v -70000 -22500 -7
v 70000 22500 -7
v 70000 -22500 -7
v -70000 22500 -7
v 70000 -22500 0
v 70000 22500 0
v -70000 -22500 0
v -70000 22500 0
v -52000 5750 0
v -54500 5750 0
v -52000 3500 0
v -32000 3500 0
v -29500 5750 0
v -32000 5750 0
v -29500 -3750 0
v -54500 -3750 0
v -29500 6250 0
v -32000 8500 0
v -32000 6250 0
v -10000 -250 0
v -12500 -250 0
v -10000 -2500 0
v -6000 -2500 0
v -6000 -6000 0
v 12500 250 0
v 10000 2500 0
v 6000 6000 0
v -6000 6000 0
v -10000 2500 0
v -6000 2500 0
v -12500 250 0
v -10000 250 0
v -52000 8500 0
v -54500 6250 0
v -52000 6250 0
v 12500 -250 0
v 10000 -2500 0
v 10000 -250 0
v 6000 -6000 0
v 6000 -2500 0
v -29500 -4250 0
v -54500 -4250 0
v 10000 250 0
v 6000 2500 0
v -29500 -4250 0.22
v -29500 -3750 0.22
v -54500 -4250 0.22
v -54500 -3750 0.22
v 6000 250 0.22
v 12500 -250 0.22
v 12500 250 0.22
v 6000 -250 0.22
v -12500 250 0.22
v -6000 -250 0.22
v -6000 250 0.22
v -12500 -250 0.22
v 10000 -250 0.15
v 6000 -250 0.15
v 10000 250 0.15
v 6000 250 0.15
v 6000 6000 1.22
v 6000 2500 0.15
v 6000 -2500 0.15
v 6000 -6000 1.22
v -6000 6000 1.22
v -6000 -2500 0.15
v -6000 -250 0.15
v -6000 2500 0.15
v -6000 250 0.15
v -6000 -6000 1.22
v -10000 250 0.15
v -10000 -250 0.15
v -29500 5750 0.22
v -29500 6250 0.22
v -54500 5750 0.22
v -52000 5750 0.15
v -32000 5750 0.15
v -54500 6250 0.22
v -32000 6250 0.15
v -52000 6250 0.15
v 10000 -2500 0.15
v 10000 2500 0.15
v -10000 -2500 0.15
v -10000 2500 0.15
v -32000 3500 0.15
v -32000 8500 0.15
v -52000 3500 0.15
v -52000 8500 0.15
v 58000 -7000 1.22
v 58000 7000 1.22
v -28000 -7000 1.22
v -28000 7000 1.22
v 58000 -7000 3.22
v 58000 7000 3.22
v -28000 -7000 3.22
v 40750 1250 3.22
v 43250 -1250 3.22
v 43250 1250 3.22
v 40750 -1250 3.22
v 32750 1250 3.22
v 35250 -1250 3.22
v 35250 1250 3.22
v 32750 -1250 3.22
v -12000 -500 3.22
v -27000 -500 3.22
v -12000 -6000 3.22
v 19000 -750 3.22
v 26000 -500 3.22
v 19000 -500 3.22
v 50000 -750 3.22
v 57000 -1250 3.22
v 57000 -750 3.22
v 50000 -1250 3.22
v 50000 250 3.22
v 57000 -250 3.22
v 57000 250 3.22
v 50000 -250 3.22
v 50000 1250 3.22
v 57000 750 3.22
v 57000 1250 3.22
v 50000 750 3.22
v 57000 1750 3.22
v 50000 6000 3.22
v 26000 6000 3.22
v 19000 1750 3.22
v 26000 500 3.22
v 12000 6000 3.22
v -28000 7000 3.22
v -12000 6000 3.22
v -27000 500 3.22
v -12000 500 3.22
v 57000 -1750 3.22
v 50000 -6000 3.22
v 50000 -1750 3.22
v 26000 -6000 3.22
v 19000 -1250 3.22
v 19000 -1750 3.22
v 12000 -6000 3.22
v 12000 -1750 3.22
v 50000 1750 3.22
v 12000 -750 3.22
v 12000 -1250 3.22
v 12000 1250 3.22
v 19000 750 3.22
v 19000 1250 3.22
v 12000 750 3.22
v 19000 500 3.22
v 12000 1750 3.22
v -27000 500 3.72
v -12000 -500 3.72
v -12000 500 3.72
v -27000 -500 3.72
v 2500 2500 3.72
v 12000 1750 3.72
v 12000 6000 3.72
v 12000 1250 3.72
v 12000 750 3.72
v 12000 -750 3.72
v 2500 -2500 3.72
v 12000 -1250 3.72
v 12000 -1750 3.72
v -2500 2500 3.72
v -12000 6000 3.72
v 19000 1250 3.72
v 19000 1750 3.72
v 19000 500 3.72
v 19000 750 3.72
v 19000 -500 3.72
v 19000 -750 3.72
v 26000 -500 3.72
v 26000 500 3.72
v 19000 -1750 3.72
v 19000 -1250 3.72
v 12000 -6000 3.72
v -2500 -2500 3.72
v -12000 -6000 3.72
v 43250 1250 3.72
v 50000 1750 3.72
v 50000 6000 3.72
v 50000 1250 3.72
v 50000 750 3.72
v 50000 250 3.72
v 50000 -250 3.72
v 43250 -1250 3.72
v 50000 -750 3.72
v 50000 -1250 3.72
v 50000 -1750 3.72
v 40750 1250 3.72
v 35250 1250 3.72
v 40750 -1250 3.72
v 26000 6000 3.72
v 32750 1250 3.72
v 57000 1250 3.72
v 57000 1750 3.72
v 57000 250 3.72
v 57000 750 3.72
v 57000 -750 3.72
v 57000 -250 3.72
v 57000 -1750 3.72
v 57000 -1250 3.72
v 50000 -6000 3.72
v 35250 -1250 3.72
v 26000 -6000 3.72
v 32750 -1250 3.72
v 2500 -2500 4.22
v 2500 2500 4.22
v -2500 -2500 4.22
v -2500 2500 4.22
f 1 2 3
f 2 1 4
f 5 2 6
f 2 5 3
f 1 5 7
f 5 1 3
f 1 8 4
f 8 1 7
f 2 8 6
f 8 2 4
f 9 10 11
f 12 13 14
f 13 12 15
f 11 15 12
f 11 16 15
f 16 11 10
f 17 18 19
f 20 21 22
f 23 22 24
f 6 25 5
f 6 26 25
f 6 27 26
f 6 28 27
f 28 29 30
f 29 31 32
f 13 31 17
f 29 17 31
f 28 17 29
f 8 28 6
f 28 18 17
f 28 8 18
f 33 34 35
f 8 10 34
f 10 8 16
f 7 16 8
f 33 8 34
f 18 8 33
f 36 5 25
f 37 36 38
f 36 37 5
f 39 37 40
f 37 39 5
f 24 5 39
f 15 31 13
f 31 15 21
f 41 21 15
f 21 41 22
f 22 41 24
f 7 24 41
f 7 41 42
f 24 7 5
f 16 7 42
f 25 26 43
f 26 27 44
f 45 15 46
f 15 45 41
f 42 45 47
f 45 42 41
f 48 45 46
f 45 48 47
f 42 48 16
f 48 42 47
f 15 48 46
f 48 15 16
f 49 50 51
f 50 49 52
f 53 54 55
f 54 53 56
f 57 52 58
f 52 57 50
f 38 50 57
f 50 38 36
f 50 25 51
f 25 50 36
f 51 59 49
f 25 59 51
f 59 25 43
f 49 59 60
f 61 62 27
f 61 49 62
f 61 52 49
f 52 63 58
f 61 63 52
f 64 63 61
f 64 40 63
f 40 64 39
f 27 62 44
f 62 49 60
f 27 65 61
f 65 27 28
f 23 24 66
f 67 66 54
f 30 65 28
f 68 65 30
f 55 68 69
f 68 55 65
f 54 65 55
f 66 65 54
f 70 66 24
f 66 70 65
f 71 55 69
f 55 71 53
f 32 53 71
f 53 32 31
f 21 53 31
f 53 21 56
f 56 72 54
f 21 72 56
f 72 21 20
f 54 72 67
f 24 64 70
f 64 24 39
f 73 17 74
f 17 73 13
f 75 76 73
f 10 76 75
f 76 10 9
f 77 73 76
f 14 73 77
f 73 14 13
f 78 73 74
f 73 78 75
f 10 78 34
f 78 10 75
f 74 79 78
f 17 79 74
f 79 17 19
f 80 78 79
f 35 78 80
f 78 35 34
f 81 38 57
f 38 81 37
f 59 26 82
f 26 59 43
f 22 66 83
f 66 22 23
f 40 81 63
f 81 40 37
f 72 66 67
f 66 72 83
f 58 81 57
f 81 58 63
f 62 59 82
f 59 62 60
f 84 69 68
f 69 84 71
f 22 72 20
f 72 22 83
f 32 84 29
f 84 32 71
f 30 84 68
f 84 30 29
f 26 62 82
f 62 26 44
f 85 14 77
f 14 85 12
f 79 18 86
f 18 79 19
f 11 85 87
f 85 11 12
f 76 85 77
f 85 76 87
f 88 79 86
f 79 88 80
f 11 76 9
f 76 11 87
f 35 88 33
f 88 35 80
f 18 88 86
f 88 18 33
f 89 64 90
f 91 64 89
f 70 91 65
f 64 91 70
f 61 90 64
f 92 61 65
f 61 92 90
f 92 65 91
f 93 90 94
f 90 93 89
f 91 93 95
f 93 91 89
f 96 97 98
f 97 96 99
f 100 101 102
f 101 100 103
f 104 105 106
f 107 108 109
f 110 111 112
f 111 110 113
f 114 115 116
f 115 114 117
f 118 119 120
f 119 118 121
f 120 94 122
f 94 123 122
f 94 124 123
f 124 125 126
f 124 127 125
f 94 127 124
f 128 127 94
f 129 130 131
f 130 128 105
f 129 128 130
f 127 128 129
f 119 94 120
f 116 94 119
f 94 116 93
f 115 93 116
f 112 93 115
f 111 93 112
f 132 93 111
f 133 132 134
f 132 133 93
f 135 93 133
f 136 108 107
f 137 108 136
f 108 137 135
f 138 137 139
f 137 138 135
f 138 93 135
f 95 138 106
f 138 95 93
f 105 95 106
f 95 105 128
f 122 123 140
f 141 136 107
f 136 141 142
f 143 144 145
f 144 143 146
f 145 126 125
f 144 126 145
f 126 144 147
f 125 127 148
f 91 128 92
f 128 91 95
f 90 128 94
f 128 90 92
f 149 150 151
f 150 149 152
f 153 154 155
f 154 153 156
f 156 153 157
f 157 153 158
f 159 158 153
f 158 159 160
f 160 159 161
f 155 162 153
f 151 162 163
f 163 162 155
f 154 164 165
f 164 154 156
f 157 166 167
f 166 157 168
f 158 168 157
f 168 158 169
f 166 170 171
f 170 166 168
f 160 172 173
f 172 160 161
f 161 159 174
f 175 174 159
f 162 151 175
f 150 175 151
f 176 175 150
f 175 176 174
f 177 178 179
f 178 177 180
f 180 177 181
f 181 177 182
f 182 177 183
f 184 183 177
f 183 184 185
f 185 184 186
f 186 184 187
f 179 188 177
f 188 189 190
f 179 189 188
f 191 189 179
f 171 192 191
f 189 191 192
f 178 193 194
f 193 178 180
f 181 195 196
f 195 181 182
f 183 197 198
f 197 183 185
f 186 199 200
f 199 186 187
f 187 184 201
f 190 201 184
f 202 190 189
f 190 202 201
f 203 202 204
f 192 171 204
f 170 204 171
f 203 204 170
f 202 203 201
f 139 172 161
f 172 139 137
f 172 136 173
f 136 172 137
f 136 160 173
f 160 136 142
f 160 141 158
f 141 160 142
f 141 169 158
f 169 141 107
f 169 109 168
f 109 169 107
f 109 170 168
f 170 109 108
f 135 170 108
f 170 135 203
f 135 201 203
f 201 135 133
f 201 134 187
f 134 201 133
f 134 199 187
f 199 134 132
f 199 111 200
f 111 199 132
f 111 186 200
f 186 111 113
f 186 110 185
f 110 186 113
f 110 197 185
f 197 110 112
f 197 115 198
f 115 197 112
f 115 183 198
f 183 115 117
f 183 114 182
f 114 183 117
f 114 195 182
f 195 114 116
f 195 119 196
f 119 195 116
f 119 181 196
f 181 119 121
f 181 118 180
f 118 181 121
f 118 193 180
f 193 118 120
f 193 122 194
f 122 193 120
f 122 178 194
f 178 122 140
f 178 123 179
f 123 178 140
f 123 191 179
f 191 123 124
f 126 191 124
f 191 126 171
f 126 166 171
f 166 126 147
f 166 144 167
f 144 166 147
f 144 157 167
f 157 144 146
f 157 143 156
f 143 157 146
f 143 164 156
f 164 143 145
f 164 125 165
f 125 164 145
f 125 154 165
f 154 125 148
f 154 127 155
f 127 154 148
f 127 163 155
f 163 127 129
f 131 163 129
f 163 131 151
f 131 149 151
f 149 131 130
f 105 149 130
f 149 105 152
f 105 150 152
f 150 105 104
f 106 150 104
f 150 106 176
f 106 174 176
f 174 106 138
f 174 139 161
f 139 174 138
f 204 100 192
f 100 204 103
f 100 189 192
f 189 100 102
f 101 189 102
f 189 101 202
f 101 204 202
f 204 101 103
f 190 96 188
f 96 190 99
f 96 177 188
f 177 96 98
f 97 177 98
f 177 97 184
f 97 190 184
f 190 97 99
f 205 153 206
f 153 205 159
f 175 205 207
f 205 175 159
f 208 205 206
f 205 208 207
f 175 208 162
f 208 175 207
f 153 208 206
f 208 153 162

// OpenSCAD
// Generated by SolidPython 1.1.3 on 2026-02-12 11:32:57


scale(v = 1) {
	translate(v = [0, 0, 0]) {
		union() {
			color(alpha = 1.0000000000, c = [0.5500000000, 0.5500000000, 0.7000000000]) {
				translate(v = [0, 0, -7.0000000000]) {
					linear_extrude(height = 5.0000000000) {
						polygon(points = [[-70000, -22500], [-70000, 22500], [70000, 22500], [70000, -22500]]);
					}
				}
			}
			color(alpha = 1.0000000000, c = [0.8500000000, 0.8500000000, 0.6000000000]) {
				translate(v = [0, 0, -2.0000000000]) {
					linear_extrude(height = 2.0000000000) {
						polygon(points = [[-70000, -22500], [-70000, 22500], [70000, 22500], [70000, -22500]]);
					}
				}
			}
			color(alpha = 1.0000000000, c = [0.5500000000, 0.5500000000, 0.7000000000]) {
				translate(v = [0, 0, 0.0000000000]) {
					linear_extrude(height = 0.2200000000) {
						polygon(points = [[-54500, -4250], [-54500, -3750], [-29500, -3750], [-29500, -4250]]);
					}
				}
			}
			color(alpha = 1.0000000000, c = [0.5500000000, 0.5500000000, 0.7000000000]) {
				translate(v = [0, 0, 0.0000000000]) {
					linear_extrude(height = 0.2200000000) {
						polygon(points = [[-6000, -6000], [-6000, -250], [-12500, -250], [-12500, 250], [-6000, 250], [-6000, 6000], [6000, 6000], [6000, 250], [12500, 250], [12500, -250], [6000, -250], [6000, -6000]]);
					}
				}
			}
			color(alpha = 1.0000000000, c = [0.5500000000, 0.5500000000, 0.7000000000]) {
				translate(v = [0, 0, 0.0000000000]) {
					linear_extrude(height = 0.2200000000) {
						polygon(points = [[-54500, 5750], [-54500, 6250], [-29500, 6250], [-29500, 5750]]);
					}
				}
			}
			color(alpha = 1.0000000000, c = [0.5500000000, 0.5500000000, 0.7000000000]) {
				translate(v = [0, 0, 0.0000000000]) {
					linear_extrude(height = 0.1500000000) {
						polygon(points = [[-10000, -2500], [-10000, 2500], [10000, 2500], [10000, -2500]]);
					}
				}
			}
			color(alpha = 1.0000000000, c = [0.5500000000, 0.5500000000, 0.7000000000]) {
				translate(v = [0, 0, 0.0000000000]) {
					linear_extrude(height = 0.1500000000) {
						polygon(points = [[-52000, 3500], [-52000, 8500], [-32000, 8500], [-32000, 3500]]);
					}
				}
			}
			color(alpha = 1.0000000000, c = [0.8500000000, 0.8500000000, 0.6000000000]) {
				translate(v = [0, 0, 0.2200000000]) {
					linear_extrude(height = 1.0000000000) {
						polygon(points = [[-6000, -6000], [-6000, 6000], [6000, 6000], [6000, -6000]]);
					}
				}
			}
			color(alpha = 1.0000000000, c = [0.8500000000, 0.8500000000, 0.6000000000]) {
				translate(v = [0, 0, 1.2200000000]) {
					linear_extrude(height = 2.0000000000) {
						polygon(points = [[-28000, -7000], [-28000, 7000], [58000, 7000], [58000, -7000]]);
					}
				}
			}
			color(alpha = 1.0000000000, c = [0.9000000000, 0.7000000000, 0.7000000000]) {
				translate(v = [0, 0, 0.2200000000]) {
					linear_extrude(height = 0.2000000000) {
						polygon(points = [[-5000, -5000], [-5000, 5000], [5000, 5000], [5000, -5000]]);
					}
				}
			}
			color(alpha = 1.0000000000, c = [0.9000000000, 0.7000000000, 0.7000000000]) {
				translate(v = [0, 0, 3.2200000000]) {
					linear_extrude(height = 0.5000000000) {
						difference() {
							polygon(points = [[-12000, -6000], [-12000, -500], [-27000, -500], [-27000, 500], [-12000, 500], [-12000, 6000], [12000, 6000], [12000, 1750], [19000, 1750], [19000, 1250], [12000, 1250], [12000, 750], [19000, 750], [19000, 500], [26000, 500], [26000, 6000], [50000, 6000], [50000, 1750], [57000, 1750], [57000, 1250], [50000, 1250], [50000, 750], [57000, 750], [57000, 250], [50000, 250], [50000, -250], [57000, -250], [57000, -750], [50000, -750], [50000, -1250], [57000, -1250], [57000, -1750], [50000, -1750], [50000, -6000], [26000, -6000], [26000, -500], [19000, -500], [19000, -750], [12000, -750], [12000, -1250], [19000, -1250], [19000, -1750], [12000, -1750], [12000, -6000]]);
							polygon(points = [[-5250, -1250], [-2750, -1250], [-2750, 1250], [-5250, 1250]]);
							polygon(points = [[2750, -1250], [5250, -1250], [5250, 1250], [2750, 1250]]);
							polygon(points = [[32750, -1250], [35250, -1250], [35250, 1250], [32750, 1250]]);
							polygon(points = [[40750, -1250], [43250, -1250], [43250, 1250], [40750, 1250]]);
						}
					}
				}
			}
			color(alpha = 1.0000000000, c = [0.9000000000, 0.7000000000, 0.7000000000]) {
				translate(v = [0, 0, 3.2200000000]) {
					linear_extrude(height = 0.5000000000) {
						polygon(points = [[-5500, -5500], [-5500, 5500], [5500, 5500], [5500, -5500]]);
					}
				}
			}
			color(alpha = 1.0000000000, c = [0.7500000000, 0.7500000000, 0.7800000000]) {
				translate(v = [0, 0, 3.7200000000]) {
					linear_extrude(height = 0.5000000000) {
						polygon(points = [[-2500, -2500], [-2500, 2500], [2500, 2500], [2500, -2500]]);
					}
				}
			}
		}
	}
}
/***********************************************
*********      SolidPython code:      **********
************************************************
 
##
## Copyright (c) 2018-2019 Thomas Kramer.
## 
## This file is part of gds3xtrude 
## (see https://codeberg.org/tok/gds3xtrude).
## 
## This program is free software: you can redistribute it and/or modify
## it under the terms of the GNU Affero General Public License as
## published by the Free Software Foundation, either version 3 of the
## License, or (at your option) any later version.
## 
## This program is distributed in the hope that it will be useful,
## but WITHOUT ANY WARRANTY; without even the implied warranty of
## MERCHANTABILITY or FITNESS FOR A PARTICULAR PURPOSE.  See the
## GNU Affero General Public License for more details.
## 
## You should have received a copy of the GNU Affero General Public License
## along with this program. If not, see <http://www.gnu.org/licenses/>.
##

from .gds3xtrude import LayerStackBuilder, build_layerstack, DEFAULT_COLOR, DEFAULT_MATERIAL
from typing import Iterable, Tuple, Dict, Optional
from .types import Material
from solid import *
from solid import utils

# klayout.db should not be imported if script is run from KLayout GUI.
try:
    # Try to import pya if run inside KLayout GUI
    import pya
except:
    import klayout.db as pya

import logging

logger = logging.getLogger(__name__)


class OpenSCADLayerStackBuilder(LayerStackBuilder):

    def __init__(self):
        self.volumes = []
        self.scale_factor = 1
        self.translation = (0, 0, 0)

    def add_polygon(self,
                    hull: Iterable[Tuple[int, int]],
                    holes: Iterable[Iterable[Tuple[int, int]]],
                    z_offset: float,
                    thickness: float,
                    material: Material = DEFAULT_MATERIAL):
        solid_hull = polygon(hull)
        solid_holes = [polygon(h) for h in holes]

        if len(holes) > 0:
            solid_poly = difference()(solid_hull, *solid_holes)
        else:
            solid_poly = solid_hull

        volume = linear_extrude(thickness)(solid_poly)
        volume = utils.up(z_offset)(volume)
        volume = color(material.getattr('color', DEFAULT_COLOR))(volume)

        self.volumes.append(volume)

    def scale(self, f: float):
        self.scale_factor = f

    def translate(self, t: Tuple[float, float, float]):
        self.translation = t

    def build_volume(self):
        volume = scale(self.scale_factor)(
            translate(self.translation)(
                union()(*self.volumes)
            )
        )
        return volume


def render_scad_to_file(layout: pya.Layout,
                        top_cell: pya.Cell,
                        tech_file: str,
                        output_file: str,
                        **kw):
    """ Same as `render_scad` but write the output directly to a file.
    :param layout:  pya.Layout
    :param top_cell: pya.Cell
    :param tech_file:   Path to description of the layer stack.
    :param output_file: Path to OpenSCAD output file.
    :param approx_error:    Approximate polygons before conversion.
    :param material_map:   Mapping from layer number to materials. Dict[(int, int), Material]
    :param centered:    Move the center of the layout to (0, 0).
    :param scale_factor:    Scale the layout before conversion.
    :param selection_box: An optional pya.Box to select which part of the layout should be converted to masks.
    :return: None
    """

    volume = render_scad(layout, top_cell, tech_file, **kw)

    logger.info("Writing SCAD: %s", output_file)
    scad_render_to_file(volume, filepath=output_file)


def render_scad(layout: pya.Layout,
                top_cell: pya.Cell,
                tech_file,
                approx_error: float = 0,
                material_map: Optional[Dict[Tuple[int, int], Material]] = None,
                centered: bool = False,
                scale_factor: float = 1,
                selection_box: Optional[pya.Box] = None):
    """ Transform the first pya.Cell in `layout` into a solidpython volume.
    :param layout:  pya.Layout
    :param top_cell: pya.Cell
    :param tech_file:   Path to description of the layer stack.
    :param approx_error:    Approximate polygons before conversion.
    :param material_map:   Mapping from layer number to materials. Dict[(int, int), Material]
    :param centered:    Move the center of the layout to (0, 0).
    :param scale_factor:    Scale the layout before conversion.
    :param selection_box: An optional pya.Box to select which part of the layout should be converted to masks.
    :return: solidpython volume
    """

    builder = OpenSCADLayerStackBuilder()

    build_layerstack(builder=builder,
                     layout=layout,
                     top_cell=top_cell,
                     tech_file=tech_file,
                     approx_error=approx_error,
                     material_map=material_map,
                     centered=centered,
                     scale_factor=scale_factor,
                     selection_box=selection_box)

    volume = builder.build_volume()

    return volume
 
 
************************************************/
